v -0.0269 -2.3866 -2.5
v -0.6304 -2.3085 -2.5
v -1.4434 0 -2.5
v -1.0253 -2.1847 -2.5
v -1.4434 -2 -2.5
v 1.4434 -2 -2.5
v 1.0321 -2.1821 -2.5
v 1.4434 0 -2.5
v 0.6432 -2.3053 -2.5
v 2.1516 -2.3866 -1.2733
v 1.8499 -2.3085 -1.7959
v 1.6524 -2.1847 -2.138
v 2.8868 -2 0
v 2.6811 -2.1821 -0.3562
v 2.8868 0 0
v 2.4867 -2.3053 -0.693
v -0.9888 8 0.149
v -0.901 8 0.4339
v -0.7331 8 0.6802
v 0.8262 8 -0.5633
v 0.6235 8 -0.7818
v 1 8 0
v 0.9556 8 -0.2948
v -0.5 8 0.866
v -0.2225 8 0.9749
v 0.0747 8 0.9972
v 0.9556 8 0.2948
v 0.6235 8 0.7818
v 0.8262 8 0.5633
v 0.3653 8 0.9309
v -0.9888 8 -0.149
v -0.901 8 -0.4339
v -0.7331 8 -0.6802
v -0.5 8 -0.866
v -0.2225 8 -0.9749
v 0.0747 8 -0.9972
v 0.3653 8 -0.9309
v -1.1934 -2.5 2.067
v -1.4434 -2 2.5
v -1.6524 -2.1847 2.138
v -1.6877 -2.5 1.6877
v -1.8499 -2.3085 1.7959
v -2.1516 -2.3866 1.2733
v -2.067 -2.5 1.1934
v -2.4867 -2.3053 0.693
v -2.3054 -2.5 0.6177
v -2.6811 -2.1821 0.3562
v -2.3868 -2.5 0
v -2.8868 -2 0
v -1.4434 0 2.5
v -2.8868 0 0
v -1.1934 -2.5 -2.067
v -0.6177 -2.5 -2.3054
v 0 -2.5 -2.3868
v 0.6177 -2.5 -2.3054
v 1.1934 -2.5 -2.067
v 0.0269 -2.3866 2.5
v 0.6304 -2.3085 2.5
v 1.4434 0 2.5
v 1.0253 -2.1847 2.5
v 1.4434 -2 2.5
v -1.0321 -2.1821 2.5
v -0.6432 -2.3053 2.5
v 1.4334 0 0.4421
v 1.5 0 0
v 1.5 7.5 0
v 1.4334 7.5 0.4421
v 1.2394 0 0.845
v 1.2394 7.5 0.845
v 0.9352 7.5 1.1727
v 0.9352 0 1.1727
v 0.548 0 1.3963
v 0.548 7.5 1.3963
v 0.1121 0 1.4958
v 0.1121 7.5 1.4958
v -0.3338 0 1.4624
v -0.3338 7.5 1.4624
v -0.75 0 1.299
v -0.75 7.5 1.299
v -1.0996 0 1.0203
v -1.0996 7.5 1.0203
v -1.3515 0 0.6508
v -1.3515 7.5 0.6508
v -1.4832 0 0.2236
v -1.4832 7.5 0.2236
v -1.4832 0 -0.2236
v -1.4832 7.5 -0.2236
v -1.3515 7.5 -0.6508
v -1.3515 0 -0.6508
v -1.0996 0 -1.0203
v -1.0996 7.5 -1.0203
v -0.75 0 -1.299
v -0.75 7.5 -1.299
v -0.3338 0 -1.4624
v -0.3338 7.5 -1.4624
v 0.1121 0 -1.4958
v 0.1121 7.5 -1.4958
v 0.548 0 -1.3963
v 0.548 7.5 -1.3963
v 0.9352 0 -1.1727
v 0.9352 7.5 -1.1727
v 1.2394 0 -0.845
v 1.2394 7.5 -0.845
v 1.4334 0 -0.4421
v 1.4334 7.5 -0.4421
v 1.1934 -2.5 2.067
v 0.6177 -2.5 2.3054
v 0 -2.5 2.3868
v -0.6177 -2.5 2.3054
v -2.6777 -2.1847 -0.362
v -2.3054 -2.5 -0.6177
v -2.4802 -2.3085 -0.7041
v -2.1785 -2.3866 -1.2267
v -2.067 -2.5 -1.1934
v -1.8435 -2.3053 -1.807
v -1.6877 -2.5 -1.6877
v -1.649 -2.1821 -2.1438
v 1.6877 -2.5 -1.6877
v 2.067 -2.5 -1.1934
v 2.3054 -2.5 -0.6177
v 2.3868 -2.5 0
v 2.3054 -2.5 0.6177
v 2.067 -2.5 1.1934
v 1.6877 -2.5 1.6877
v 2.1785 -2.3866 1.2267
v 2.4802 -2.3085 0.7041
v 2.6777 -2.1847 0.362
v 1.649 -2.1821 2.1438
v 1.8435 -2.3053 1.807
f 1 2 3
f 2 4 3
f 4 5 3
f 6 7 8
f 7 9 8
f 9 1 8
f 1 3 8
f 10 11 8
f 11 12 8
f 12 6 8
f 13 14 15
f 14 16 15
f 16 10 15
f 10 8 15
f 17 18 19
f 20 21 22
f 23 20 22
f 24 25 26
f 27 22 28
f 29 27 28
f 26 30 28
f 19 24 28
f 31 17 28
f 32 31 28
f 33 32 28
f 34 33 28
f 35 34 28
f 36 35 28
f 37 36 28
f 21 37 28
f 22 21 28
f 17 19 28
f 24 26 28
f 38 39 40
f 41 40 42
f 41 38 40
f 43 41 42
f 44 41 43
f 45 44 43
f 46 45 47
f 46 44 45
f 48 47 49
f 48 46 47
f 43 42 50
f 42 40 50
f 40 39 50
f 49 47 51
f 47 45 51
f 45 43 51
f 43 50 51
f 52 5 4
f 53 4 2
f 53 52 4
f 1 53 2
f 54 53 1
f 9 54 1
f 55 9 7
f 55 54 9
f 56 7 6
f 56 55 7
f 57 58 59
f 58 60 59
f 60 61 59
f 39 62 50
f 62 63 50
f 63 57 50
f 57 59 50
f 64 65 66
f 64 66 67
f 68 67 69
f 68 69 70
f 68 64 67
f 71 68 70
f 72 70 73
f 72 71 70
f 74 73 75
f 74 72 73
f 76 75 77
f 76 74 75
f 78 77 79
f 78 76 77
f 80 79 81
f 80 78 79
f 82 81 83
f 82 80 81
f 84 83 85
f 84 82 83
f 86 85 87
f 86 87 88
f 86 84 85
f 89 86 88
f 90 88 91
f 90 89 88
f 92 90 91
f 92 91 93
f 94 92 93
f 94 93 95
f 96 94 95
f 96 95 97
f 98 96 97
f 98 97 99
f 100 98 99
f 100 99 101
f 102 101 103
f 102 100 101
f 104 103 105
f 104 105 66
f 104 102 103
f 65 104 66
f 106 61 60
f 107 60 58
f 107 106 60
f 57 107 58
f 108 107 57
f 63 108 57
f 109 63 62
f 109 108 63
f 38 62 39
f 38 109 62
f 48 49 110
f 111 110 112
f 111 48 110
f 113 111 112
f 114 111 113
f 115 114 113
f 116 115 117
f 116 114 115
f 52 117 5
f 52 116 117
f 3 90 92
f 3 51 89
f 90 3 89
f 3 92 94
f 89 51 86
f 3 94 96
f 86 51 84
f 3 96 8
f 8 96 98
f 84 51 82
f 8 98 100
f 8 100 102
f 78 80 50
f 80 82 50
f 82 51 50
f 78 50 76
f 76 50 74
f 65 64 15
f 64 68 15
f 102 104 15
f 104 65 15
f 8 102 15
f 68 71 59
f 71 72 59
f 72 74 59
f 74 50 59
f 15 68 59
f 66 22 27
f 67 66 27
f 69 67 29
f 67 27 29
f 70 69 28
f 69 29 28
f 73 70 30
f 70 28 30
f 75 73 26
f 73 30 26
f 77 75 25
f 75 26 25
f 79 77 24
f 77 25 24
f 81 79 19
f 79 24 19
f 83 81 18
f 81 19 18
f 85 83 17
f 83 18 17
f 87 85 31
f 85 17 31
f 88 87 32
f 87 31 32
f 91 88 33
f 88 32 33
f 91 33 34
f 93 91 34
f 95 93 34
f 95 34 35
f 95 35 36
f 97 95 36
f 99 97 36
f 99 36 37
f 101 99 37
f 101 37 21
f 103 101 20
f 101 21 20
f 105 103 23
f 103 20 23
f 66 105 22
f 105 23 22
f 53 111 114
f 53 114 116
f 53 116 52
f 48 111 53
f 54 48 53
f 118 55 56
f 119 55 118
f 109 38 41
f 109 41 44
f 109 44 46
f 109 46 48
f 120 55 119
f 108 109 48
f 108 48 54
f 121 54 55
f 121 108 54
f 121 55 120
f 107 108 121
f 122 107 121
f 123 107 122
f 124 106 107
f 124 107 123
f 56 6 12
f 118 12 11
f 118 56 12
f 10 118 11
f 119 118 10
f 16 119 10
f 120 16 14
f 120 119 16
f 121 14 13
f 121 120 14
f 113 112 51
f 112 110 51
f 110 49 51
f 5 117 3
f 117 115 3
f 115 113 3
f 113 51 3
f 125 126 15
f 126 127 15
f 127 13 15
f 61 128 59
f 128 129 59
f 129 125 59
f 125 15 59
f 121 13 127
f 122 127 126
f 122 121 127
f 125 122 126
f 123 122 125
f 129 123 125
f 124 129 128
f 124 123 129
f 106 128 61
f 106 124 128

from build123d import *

# Parameters (mm, degrees)
F0_R     = 1.5
F1_DEPTH = 2.5
F2_SIZE  = 0.5
F3_DEPTH = 25
F4_DEPTH = 8
F5_SIZE  = 0.5


with BuildPart() as f1:
    # F0 (on Front) → F1 (new body)
    with BuildSketch(Plane.XZ):
        Polygon((1.443375673, 2.5), (-1.443375673, 2.5), (-2.8867513459, 0), (-1.443375673, -2.5), (1.443375673, -2.5), (2.8867513459, 0), align=None)
        Circle(F0_R, mode=Mode.SUBTRACT)
        Circle(F0_R)
        with BuildLine():
            ThreePointArc((2.8867513459, 0), (2.5, 1.443375673), (1.443375673, 2.5))
            Line((1.443375673, 2.5), (2.8867513459, 0))
        make_face()
        with BuildLine():
            ThreePointArc((1.443375673, 2.5), (0, 2.8867513459), (-1.443375673, 2.5))
            Line((-1.443375673, 2.5), (1.443375673, 2.5))
        make_face()
        with BuildLine():
            Line((1.443375673, -2.5), (-1.443375673, -2.5))
            ThreePointArc((-1.443375673, -2.5), (0, -2.8867513459), (1.443375673, -2.5))
        make_face()
        with BuildLine():
            ThreePointArc((1.443375673, -2.5), (2.5, -1.443375673), (2.8867513459, 0))
            Line((2.8867513459, 0), (1.443375673, -2.5))
        make_face()
        with BuildLine():
            Line((-1.443375673, -2.5), (-2.8867513459, 0))
            ThreePointArc((-2.8867513459, 0), (-2.5, -1.443375673), (-1.443375673, -2.5))
        make_face()
        with BuildLine():
            Line((-2.8867513459, 0), (-1.443375673, 2.5))
            ThreePointArc((-1.443375673, 2.5), (-2.5, 1.443375673), (-2.8867513459, 0))
        make_face()
    extrude(amount=F1_DEPTH)

    # F2
    f2_edges = [f1.edges().sort_by_distance(p)[0] for p in [
        (1.443376, -2.5, -2.5),
    ]]
    chamfer(f2_edges, length=F2_SIZE)

    # F0 (on Front) → F3 (intersect)
    with BuildSketch(Plane.XZ):
        Polygon((1.443375673, 2.5), (-1.443375673, 2.5), (-2.8867513459, 0), (-1.443375673, -2.5), (1.443375673, -2.5), (2.8867513459, 0), align=None)
        Circle(F0_R, mode=Mode.SUBTRACT)
        Circle(F0_R)
    extrude(amount=F3_DEPTH, mode=Mode.INTERSECT)

    # F0 (on Front) → F4 (join)
    with BuildSketch(Plane.XZ):
        Circle(F0_R)
    extrude(amount=-F4_DEPTH)

    # F5
    f5_edges = [f1.edges().sort_by_distance(p)[0] for p in [
        (-1.5, 8, 0),
    ]]
    chamfer(f5_edges, length=F5_SIZE)


solid = f1.part
